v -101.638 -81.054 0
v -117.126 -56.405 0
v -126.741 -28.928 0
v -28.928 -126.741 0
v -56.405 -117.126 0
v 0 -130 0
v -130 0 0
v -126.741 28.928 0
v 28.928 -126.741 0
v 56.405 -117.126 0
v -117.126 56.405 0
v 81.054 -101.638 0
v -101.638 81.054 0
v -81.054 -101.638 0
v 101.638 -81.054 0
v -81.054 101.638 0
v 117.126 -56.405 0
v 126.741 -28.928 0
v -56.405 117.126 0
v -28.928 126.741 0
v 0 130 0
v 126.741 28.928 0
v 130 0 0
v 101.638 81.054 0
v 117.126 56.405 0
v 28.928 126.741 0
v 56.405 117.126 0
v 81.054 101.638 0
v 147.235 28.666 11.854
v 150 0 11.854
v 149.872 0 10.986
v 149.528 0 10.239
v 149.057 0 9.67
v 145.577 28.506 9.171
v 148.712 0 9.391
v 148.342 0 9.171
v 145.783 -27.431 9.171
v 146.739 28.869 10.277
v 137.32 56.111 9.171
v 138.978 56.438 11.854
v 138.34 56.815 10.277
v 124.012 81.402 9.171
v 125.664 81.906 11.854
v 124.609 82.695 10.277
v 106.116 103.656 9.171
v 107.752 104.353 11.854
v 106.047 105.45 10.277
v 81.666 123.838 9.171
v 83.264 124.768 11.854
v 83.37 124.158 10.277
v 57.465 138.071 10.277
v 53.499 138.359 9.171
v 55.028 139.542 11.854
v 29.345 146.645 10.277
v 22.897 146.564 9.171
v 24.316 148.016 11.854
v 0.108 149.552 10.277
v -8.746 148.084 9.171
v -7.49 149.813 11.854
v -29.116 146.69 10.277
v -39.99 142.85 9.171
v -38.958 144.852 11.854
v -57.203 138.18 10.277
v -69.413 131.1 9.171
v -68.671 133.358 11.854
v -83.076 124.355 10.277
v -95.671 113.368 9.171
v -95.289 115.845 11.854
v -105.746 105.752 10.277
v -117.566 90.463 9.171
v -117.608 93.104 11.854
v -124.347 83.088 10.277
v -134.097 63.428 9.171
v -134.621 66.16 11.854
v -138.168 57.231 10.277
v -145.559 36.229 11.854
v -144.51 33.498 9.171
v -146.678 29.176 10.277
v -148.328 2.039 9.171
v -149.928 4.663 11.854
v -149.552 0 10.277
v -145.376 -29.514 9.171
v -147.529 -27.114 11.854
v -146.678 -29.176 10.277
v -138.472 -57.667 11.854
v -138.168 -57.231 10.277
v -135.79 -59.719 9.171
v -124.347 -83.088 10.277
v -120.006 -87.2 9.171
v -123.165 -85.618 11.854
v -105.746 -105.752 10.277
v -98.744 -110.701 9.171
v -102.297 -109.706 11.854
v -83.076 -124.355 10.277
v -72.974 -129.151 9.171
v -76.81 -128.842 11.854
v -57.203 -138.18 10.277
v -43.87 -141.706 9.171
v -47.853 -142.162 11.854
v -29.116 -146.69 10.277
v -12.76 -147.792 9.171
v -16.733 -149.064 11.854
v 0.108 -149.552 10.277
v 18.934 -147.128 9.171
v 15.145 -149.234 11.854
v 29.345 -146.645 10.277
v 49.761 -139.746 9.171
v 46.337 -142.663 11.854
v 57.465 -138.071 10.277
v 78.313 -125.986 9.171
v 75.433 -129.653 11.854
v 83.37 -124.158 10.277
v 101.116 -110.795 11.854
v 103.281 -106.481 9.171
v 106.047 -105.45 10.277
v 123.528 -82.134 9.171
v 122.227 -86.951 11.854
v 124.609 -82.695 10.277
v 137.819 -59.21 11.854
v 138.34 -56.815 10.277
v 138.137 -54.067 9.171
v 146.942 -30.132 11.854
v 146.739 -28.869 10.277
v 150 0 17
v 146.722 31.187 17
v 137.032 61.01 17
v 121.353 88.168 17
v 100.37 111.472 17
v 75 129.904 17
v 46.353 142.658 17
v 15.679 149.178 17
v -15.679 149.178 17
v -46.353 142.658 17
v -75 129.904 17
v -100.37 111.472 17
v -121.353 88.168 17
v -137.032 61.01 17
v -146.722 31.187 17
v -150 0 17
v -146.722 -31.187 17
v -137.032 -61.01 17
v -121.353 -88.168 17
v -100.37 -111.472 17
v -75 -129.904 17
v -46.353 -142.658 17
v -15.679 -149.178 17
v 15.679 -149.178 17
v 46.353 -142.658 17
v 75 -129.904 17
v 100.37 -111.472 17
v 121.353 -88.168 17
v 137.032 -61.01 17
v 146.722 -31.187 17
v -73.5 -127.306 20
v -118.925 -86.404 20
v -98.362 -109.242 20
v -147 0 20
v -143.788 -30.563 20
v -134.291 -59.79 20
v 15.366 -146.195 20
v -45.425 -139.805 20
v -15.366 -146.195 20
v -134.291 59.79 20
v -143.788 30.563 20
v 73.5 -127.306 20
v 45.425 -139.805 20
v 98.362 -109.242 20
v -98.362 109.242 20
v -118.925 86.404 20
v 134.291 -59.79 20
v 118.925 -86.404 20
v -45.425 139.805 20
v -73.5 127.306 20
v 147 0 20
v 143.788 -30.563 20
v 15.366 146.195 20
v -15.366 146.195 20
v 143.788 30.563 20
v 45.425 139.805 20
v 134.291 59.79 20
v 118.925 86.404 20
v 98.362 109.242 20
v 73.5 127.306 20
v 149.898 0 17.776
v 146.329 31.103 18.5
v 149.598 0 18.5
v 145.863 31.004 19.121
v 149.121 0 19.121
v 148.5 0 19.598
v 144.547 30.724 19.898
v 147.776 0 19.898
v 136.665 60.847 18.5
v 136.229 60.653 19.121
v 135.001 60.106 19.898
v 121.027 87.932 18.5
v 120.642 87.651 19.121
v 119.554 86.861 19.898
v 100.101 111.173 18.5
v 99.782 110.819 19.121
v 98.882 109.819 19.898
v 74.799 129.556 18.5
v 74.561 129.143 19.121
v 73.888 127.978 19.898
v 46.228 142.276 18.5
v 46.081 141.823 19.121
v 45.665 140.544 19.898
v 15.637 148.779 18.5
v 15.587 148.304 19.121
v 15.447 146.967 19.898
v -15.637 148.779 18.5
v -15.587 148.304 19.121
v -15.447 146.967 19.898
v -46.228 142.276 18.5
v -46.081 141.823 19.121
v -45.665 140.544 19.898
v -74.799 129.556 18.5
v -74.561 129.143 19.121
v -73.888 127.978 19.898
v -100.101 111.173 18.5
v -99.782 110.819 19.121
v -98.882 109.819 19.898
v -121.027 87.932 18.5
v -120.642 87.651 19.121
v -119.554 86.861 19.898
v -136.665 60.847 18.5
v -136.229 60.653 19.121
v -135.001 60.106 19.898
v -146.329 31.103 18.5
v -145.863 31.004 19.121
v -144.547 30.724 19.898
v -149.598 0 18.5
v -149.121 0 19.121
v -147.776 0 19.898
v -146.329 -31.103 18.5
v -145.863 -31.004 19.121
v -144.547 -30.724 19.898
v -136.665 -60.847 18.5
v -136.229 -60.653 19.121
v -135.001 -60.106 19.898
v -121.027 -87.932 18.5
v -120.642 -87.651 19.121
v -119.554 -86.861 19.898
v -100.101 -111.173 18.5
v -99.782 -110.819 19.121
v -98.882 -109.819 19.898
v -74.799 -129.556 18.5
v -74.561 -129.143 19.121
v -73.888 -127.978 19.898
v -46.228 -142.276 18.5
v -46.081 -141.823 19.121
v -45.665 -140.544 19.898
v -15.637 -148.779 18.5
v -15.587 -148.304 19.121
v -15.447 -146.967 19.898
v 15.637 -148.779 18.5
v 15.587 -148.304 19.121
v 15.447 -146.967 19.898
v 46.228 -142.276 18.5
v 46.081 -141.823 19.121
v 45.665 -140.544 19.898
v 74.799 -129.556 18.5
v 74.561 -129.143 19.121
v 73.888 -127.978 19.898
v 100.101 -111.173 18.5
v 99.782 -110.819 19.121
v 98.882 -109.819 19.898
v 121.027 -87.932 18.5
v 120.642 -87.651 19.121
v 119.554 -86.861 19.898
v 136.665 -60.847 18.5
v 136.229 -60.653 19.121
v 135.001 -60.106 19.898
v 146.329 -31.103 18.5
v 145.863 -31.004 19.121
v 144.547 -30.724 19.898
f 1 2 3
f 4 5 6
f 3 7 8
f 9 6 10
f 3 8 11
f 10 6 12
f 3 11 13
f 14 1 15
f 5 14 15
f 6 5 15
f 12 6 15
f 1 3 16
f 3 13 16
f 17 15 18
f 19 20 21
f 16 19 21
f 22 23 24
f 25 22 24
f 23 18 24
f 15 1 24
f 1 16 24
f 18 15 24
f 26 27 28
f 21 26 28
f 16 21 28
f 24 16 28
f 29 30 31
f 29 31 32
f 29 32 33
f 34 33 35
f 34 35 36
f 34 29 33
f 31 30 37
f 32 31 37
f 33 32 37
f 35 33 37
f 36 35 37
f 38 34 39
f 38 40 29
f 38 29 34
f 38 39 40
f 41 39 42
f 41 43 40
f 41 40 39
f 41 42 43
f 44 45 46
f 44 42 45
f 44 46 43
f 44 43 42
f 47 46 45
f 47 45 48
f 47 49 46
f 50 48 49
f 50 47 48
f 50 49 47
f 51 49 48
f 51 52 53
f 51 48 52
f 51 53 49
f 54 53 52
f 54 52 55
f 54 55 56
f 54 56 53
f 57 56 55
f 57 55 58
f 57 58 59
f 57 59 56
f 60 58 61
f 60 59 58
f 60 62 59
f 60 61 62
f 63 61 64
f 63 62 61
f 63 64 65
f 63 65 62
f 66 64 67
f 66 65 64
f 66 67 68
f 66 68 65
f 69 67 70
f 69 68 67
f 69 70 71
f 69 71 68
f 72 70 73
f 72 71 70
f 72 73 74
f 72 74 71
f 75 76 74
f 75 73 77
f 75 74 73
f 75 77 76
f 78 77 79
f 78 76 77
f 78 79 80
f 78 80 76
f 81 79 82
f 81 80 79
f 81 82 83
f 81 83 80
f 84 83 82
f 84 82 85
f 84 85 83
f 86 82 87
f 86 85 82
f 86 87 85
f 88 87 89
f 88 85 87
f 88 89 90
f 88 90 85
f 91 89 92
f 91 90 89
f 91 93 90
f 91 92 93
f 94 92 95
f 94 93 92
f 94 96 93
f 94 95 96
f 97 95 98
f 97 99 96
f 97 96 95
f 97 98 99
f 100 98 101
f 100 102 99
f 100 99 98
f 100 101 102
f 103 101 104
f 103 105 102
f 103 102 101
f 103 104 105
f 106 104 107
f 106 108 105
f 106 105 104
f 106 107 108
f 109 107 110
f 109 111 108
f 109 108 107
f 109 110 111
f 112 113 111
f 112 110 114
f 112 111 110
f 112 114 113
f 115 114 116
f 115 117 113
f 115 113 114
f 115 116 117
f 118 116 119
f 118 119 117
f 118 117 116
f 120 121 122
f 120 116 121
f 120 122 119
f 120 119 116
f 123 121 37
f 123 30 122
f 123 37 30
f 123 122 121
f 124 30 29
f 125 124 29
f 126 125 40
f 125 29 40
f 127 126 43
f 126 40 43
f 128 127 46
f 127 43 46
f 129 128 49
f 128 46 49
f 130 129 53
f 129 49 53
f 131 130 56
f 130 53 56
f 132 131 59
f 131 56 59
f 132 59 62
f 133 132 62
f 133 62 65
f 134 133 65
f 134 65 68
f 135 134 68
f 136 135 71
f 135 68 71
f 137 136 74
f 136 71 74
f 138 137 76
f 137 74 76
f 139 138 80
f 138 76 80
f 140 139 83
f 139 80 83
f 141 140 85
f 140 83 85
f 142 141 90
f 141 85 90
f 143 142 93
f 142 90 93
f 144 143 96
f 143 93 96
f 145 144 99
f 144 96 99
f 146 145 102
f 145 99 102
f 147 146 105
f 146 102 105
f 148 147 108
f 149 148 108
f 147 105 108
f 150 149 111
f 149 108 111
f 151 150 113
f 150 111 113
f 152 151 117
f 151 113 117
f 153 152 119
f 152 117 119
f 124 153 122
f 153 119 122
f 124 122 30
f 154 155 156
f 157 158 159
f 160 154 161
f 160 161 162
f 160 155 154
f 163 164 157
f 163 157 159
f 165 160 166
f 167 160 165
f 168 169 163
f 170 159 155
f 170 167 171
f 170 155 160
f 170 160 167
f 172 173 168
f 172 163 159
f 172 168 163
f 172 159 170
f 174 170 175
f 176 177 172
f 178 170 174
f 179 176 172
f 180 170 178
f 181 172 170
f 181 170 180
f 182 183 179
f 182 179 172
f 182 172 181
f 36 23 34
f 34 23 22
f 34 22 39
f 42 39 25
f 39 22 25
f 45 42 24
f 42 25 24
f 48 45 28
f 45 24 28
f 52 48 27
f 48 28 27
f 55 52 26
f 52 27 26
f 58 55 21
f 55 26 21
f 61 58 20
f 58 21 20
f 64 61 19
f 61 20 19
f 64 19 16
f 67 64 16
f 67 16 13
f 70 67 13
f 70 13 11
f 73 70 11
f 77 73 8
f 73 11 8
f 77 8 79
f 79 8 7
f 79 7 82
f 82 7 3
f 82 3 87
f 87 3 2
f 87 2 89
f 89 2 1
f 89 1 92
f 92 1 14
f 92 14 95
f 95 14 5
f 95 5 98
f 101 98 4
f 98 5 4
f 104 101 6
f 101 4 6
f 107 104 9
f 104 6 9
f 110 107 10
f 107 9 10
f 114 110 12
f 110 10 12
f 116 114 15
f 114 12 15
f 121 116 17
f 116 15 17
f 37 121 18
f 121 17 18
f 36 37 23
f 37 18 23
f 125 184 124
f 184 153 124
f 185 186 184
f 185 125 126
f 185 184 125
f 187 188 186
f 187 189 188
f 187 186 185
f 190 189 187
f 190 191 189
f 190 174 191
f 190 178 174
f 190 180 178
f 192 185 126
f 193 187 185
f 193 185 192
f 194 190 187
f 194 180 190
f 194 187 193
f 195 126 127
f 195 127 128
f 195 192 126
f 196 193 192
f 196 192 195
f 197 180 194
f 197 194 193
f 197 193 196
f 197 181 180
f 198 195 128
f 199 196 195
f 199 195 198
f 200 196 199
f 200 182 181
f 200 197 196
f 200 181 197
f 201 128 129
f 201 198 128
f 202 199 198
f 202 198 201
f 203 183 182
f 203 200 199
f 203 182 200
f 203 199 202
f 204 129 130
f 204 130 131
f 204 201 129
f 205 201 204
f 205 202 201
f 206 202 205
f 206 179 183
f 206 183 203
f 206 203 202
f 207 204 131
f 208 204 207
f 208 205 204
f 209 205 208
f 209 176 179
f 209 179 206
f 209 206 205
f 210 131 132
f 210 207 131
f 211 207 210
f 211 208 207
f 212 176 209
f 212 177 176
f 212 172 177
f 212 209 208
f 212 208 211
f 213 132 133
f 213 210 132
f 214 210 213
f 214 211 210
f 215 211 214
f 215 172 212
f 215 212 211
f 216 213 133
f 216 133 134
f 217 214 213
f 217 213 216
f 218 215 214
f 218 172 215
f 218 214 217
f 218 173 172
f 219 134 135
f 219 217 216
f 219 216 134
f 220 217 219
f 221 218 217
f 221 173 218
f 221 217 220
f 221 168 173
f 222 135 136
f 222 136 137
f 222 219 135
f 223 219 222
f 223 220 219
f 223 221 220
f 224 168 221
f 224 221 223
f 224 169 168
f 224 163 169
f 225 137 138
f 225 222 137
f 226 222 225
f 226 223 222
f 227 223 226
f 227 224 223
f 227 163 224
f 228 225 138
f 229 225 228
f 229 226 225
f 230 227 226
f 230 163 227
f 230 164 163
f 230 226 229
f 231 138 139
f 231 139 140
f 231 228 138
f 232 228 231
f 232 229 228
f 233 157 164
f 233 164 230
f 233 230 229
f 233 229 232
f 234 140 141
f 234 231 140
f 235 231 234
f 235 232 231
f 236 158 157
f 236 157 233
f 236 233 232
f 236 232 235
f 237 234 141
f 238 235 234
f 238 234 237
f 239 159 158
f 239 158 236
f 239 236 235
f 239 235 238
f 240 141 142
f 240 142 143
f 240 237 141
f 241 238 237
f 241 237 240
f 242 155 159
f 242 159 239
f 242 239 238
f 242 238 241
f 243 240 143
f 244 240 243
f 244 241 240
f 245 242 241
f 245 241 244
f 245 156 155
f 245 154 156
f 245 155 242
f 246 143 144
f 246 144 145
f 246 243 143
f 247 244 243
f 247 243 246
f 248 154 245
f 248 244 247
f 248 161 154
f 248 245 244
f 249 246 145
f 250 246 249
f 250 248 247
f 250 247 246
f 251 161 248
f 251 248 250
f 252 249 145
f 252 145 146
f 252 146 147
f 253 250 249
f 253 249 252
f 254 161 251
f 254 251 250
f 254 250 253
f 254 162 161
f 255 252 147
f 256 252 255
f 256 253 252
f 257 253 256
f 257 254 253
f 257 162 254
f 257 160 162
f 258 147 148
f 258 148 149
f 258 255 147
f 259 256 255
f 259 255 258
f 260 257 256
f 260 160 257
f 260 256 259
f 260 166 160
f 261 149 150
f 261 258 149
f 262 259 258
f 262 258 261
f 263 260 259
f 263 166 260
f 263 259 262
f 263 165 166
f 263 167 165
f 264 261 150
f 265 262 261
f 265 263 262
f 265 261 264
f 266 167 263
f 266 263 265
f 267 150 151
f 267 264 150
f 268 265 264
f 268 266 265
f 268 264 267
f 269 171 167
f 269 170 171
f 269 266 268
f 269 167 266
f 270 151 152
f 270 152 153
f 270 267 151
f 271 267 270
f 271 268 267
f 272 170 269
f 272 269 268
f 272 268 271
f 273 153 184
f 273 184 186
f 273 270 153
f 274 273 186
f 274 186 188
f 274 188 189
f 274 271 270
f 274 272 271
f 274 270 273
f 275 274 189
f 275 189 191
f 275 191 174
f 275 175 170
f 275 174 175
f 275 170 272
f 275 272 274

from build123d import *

# Parameters (mm, degrees)
F0_R     = 150
F1_DEPTH = 20
F2_SIZE2 = 20
F2_SIZE  = 10
F3_R     = 3
F4_R     = 3


with BuildPart() as f1:
    # F0 (on Top) → F1 (new body)
    with BuildSketch(Plane.XY):
        Circle(F0_R)
    extrude(amount=F1_DEPTH)

    # F2
    f2_edges = [f1.edges().sort_by_distance(p)[0] for p in [
        (-150, 0, 0),
    ]]
    chamfer(f2_edges, length=F2_SIZE, length2=F2_SIZE2)

    # F3
    f3_edges = [f1.edges().sort_by_distance(p)[0] for p in [
        (-150, 0, 20),
    ]]
    fillet(f3_edges, radius=F3_R)

    # F4
    f4_edges = [f1.edges().sort_by_distance(p)[0] for p in [
        (-150, 0, 10),
    ]]
    fillet(f4_edges, radius=F4_R)


solid = f1.part
